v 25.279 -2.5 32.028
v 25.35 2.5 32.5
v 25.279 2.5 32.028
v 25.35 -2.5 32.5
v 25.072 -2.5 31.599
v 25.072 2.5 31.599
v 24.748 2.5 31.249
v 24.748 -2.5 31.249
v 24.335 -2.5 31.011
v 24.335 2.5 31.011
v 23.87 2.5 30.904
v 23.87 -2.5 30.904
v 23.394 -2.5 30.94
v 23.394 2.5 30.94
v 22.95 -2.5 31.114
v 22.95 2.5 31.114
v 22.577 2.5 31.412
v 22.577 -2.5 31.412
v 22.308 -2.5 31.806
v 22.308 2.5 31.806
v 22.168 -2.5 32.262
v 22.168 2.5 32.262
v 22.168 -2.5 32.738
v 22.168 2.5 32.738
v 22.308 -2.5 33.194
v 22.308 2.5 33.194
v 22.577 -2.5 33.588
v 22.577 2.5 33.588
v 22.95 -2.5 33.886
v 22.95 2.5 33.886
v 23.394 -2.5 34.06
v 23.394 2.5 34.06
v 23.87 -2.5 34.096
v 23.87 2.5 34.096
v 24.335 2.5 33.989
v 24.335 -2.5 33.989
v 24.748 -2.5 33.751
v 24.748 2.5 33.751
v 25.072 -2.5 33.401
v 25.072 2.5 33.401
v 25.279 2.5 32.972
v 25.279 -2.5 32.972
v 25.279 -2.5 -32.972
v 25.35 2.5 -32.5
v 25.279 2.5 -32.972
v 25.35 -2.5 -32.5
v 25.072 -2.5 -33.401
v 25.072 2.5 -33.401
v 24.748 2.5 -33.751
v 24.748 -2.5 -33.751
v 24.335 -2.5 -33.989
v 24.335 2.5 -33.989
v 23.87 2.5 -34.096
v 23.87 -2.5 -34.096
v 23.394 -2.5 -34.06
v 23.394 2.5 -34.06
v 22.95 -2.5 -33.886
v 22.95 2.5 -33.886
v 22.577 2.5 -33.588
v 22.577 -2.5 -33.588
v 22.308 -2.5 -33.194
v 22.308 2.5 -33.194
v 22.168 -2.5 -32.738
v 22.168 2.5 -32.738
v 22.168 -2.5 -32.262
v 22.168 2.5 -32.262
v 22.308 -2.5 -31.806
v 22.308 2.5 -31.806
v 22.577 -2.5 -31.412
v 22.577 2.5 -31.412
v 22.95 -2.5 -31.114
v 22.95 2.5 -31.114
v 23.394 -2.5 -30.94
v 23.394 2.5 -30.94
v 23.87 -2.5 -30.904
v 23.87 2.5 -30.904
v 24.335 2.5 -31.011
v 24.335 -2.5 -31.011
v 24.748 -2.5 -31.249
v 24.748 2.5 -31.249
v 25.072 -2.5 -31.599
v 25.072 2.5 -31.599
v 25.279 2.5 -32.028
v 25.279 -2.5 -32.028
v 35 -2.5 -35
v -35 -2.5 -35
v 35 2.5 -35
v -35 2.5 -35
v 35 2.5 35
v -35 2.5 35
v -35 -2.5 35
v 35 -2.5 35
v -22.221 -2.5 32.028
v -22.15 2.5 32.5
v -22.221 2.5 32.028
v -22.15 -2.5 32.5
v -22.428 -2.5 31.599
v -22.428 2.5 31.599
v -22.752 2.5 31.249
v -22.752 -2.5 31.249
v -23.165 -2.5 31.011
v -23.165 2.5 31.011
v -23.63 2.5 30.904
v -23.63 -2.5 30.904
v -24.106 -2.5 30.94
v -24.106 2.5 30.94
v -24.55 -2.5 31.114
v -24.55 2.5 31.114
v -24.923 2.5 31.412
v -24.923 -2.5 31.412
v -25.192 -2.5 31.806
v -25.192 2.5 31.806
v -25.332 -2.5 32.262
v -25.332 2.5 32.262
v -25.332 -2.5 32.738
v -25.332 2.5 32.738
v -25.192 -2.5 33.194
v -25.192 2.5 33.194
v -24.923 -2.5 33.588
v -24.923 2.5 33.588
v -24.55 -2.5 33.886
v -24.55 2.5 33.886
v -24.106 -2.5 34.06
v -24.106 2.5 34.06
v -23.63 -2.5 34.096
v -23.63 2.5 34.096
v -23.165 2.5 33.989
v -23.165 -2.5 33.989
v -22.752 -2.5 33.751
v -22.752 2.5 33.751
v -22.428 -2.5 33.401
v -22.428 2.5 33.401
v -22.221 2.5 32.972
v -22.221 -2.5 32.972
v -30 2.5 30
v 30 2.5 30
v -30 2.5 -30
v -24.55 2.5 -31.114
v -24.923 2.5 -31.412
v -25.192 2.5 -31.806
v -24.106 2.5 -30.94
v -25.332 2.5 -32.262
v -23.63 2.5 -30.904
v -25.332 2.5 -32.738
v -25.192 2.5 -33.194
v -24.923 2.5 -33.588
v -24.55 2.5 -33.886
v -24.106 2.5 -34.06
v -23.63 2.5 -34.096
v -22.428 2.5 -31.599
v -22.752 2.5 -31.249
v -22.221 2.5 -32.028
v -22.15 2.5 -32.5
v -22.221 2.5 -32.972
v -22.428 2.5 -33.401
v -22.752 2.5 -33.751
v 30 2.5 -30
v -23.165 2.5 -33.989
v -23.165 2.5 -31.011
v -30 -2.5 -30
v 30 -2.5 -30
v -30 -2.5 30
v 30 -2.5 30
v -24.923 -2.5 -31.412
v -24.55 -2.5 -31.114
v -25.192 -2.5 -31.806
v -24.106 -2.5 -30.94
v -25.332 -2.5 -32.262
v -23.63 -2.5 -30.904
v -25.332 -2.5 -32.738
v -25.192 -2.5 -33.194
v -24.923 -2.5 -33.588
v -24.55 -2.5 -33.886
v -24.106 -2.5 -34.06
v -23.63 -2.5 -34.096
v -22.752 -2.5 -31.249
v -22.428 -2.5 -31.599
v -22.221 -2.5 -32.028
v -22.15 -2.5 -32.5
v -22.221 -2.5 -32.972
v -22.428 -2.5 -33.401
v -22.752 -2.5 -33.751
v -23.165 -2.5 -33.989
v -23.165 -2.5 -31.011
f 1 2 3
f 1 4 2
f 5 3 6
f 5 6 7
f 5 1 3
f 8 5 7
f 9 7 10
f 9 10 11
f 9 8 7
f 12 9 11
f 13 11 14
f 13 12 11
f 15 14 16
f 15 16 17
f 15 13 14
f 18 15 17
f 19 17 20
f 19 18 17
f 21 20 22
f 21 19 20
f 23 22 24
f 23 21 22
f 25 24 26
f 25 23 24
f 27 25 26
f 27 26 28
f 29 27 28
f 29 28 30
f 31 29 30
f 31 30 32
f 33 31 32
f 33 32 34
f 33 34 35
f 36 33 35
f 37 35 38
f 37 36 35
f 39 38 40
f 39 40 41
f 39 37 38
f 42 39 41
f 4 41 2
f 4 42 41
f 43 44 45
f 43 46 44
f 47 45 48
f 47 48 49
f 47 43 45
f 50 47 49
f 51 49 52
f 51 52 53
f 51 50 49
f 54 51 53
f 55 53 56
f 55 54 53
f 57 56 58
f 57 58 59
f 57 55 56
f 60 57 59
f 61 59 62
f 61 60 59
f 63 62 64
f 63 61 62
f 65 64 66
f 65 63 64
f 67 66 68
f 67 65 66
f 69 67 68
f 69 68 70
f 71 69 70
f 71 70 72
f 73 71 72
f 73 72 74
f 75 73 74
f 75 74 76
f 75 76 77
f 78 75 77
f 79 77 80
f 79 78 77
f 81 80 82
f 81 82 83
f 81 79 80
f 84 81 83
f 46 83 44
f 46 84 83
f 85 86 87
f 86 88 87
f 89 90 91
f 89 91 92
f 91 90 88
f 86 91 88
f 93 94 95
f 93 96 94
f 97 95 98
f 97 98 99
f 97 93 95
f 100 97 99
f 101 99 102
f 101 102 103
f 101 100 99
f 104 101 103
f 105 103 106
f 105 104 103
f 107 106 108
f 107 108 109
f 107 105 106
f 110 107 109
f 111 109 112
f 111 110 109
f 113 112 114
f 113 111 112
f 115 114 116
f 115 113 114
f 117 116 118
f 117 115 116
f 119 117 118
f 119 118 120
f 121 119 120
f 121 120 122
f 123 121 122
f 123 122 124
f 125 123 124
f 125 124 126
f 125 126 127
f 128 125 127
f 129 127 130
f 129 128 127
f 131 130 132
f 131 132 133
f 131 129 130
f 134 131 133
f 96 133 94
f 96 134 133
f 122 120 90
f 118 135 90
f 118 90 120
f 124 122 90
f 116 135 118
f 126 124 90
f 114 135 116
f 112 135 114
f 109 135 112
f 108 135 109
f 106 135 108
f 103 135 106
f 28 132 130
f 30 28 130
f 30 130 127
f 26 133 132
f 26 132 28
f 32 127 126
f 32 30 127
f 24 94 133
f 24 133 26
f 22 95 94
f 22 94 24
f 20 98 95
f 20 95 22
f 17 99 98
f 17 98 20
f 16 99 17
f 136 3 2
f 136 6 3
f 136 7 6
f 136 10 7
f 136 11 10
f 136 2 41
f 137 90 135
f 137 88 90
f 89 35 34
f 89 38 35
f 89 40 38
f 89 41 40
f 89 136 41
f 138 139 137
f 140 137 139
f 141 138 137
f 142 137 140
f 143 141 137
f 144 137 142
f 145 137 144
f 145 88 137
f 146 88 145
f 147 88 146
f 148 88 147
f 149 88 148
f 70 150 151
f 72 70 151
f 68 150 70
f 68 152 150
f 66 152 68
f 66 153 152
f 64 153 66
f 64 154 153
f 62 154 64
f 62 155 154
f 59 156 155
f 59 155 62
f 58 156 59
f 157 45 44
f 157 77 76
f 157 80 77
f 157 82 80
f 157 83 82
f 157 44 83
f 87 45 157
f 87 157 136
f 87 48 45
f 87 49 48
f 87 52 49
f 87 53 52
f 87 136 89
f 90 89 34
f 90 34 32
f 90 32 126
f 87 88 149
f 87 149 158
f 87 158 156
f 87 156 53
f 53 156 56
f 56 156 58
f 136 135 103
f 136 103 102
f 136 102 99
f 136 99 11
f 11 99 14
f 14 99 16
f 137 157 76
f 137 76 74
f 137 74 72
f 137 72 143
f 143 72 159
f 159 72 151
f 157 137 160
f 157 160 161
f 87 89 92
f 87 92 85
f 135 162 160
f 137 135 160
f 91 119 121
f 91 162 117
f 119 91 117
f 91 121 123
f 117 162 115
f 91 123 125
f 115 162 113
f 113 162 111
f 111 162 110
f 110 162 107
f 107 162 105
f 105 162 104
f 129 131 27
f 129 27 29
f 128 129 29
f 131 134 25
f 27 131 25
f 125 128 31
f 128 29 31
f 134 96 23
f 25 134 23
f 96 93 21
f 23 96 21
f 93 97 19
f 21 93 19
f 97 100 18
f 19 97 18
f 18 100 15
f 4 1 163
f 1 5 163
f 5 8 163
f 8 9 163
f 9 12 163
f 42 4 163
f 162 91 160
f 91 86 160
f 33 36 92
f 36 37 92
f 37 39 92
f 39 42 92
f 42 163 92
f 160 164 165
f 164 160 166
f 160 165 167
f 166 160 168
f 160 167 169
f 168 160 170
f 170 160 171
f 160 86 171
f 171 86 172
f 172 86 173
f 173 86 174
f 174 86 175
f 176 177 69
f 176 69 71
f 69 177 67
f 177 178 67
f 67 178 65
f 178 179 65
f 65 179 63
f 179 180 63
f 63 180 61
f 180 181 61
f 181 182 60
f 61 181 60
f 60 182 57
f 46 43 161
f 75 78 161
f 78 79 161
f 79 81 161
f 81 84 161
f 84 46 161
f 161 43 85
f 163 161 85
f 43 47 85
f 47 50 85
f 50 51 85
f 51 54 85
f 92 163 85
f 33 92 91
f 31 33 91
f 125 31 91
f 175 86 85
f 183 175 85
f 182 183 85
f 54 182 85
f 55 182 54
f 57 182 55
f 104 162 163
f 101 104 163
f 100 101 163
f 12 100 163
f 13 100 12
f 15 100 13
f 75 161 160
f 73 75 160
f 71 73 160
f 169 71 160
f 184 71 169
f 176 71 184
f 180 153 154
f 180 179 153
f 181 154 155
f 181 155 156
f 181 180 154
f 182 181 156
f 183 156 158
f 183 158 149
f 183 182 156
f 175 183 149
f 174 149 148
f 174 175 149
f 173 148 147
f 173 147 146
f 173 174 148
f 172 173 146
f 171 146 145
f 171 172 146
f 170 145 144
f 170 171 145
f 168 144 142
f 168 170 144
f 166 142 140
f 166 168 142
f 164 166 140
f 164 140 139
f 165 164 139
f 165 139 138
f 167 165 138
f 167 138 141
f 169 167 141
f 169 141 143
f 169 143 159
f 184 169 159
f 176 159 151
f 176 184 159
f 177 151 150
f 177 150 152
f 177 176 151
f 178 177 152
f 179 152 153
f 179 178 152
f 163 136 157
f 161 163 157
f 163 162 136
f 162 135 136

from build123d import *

# Parameters (mm, degrees)
SKETCH1_W           = 70
SKETCH1_H           = 70
SKETCH1_R           = 1.6
SKETCH1_W_2         = 60
SKETCH1_H_2         = 60
BOSS_EXTRUDE1_DEPTH = 2.5


with BuildPart() as part:
    # Sketch1 → Boss-Extrude1 (new body, symmetric)
    with BuildSketch(Plane(origin=(0, 0, 0), x_dir=(1, 0, 0), z_dir=(0, 1, 0))):
        Rectangle(SKETCH1_W, SKETCH1_H)
        with Locations((-23.75, 32.5)):
            Circle(SKETCH1_R, mode=Mode.SUBTRACT)
        with Locations((23.75, 32.5)):
            Circle(SKETCH1_R, mode=Mode.SUBTRACT)
        with Locations((23.75, -32.5)):
            Circle(SKETCH1_R, mode=Mode.SUBTRACT)
        with Locations((-23.75, -32.5)):
            Circle(SKETCH1_R, mode=Mode.SUBTRACT)
        Rectangle(SKETCH1_W_2, SKETCH1_H_2, mode=Mode.SUBTRACT)
    extrude(amount=BOSS_EXTRUDE1_DEPTH, both=True)


solid = part.part
